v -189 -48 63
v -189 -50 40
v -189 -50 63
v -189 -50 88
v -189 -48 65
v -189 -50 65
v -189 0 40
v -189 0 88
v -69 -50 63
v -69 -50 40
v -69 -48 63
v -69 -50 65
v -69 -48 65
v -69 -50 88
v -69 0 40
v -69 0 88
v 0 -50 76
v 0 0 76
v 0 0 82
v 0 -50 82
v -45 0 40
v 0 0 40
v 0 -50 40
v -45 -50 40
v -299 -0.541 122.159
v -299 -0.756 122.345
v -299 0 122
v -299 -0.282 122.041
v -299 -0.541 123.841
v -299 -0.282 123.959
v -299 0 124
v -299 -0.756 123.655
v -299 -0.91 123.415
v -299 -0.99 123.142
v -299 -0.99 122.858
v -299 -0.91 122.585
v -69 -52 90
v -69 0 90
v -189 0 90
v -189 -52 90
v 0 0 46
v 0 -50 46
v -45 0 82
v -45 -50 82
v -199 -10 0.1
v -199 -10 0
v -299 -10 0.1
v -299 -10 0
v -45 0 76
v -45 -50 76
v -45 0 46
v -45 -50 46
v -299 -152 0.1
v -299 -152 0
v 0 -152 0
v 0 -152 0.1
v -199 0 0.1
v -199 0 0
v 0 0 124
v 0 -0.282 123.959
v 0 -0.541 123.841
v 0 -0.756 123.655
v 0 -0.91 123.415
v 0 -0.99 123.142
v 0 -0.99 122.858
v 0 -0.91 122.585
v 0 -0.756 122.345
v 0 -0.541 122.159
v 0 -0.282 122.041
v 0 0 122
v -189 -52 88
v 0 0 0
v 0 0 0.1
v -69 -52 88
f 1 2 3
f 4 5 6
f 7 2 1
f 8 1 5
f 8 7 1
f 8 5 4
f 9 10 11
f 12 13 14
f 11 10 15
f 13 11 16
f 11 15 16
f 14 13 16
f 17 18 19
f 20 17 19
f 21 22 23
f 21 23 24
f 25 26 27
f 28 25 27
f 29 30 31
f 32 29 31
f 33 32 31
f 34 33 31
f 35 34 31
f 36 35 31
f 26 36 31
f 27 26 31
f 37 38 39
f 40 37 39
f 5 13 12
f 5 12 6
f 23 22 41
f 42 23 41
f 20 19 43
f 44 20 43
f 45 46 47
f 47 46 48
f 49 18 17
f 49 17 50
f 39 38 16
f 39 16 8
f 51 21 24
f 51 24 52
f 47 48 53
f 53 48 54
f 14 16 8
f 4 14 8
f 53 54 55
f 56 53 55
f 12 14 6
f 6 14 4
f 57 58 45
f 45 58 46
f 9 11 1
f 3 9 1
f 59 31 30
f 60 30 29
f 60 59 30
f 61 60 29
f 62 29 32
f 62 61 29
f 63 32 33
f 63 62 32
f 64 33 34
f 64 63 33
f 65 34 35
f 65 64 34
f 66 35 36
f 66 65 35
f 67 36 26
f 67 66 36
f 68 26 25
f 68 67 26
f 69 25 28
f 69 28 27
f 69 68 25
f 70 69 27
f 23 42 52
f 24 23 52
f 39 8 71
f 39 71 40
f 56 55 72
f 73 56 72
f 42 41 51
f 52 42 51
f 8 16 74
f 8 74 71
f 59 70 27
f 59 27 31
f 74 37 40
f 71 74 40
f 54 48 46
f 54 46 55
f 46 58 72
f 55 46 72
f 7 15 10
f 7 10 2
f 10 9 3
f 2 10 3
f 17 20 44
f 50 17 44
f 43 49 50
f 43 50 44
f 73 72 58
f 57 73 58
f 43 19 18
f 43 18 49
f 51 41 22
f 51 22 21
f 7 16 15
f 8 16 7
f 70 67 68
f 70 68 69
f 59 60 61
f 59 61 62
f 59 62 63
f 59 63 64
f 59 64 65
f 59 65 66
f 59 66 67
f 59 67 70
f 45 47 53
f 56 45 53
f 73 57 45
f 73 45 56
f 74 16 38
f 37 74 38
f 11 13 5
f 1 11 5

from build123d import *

# Parameters (mm, degrees)
F2_DEPTH  = 0.1
F3_W      = 120
F3_H      = 2
F4_DEPTH  = 48
F3_H_2    = 23
F5_DEPTH  = 50
F6_DEPTH  = 52
F8_DEPTH  = 299
F3_W_2    = 45
F3_H_3    = 6
F10_DEPTH = 50


# Not quite as in the source:
# - the program builds the solid bodies; features that only make, move or delete a surface that nothing else refers to are left out


with BuildPart() as f2:
    # F0 (on Top) → F2 (new body)
    with BuildSketch(Plane.XY):
        Polygon((0, -52), (0, 0), (-199, 0), (-199, -10), (-299, -10), (-299, -152), (0, -152), align=None)
    extrude(amount=F2_DEPTH)


with BuildPart() as f4:
    # F3 (on face) → F4 (new body)
    with BuildSketch(Plane(origin=(0, 0, 0), x_dir=(-1, 0, 0), z_dir=(0, 1, 0))):
        with Locations((129, 64)):
            Rectangle(F3_W, F3_H)
    extrude(amount=-F4_DEPTH)

    # F3 (on face) → F5 (join)
    with BuildSketch(Plane(origin=(0, 0, 0), x_dir=(-1, 0, 0), z_dir=(0, 1, 0))):
        with Locations((129, 76.5)):
            Rectangle(F3_W, F3_H_2)
        with Locations((129, 51.5)):
            Rectangle(F3_W, F3_H_2)
    extrude(amount=-F5_DEPTH)


with BuildPart() as f6:
    # F3 (on face) → F6 (new body)
    with BuildSketch(Plane(origin=(0, 0, 0), x_dir=(-1, 0, 0), z_dir=(0, 1, 0))):
        with Locations((129, 89)):
            Rectangle(F3_W, F3_H)
    extrude(amount=-F6_DEPTH)


with BuildPart() as f8:
    # F7 (on face) → F8 (new body)
    with BuildSketch(Plane.YZ):
        with BuildLine():
            ThreePointArc((0, 124), (-1, 123), (0, 122))
            Line((0, 122), (0, 124))
        make_face()
    extrude(amount=-F8_DEPTH)


with BuildPart() as f10:
    # F3 (on face) → F10 (new body)
    with BuildSketch(Plane(origin=(0, 0, 0), x_dir=(-1, 0, 0), z_dir=(0, 1, 0))):
        with Locations((22.5, 79)):
            Rectangle(F3_W_2, F3_H_3)
    extrude(amount=-F10_DEPTH)


with BuildPart() as f10b:
    # F3 (on face) → F10, piece 2 (new body)
    with BuildSketch(Plane(origin=(0, 0, 0), x_dir=(-1, 0, 0), z_dir=(0, 1, 0))):
        with Locations((22.5, 43)):
            Rectangle(F3_W_2, F3_H_3)
    extrude(amount=-F10_DEPTH)


solid = Compound([f2.part, f4.part, f6.part, f8.part, f10.part, f10b.part])
